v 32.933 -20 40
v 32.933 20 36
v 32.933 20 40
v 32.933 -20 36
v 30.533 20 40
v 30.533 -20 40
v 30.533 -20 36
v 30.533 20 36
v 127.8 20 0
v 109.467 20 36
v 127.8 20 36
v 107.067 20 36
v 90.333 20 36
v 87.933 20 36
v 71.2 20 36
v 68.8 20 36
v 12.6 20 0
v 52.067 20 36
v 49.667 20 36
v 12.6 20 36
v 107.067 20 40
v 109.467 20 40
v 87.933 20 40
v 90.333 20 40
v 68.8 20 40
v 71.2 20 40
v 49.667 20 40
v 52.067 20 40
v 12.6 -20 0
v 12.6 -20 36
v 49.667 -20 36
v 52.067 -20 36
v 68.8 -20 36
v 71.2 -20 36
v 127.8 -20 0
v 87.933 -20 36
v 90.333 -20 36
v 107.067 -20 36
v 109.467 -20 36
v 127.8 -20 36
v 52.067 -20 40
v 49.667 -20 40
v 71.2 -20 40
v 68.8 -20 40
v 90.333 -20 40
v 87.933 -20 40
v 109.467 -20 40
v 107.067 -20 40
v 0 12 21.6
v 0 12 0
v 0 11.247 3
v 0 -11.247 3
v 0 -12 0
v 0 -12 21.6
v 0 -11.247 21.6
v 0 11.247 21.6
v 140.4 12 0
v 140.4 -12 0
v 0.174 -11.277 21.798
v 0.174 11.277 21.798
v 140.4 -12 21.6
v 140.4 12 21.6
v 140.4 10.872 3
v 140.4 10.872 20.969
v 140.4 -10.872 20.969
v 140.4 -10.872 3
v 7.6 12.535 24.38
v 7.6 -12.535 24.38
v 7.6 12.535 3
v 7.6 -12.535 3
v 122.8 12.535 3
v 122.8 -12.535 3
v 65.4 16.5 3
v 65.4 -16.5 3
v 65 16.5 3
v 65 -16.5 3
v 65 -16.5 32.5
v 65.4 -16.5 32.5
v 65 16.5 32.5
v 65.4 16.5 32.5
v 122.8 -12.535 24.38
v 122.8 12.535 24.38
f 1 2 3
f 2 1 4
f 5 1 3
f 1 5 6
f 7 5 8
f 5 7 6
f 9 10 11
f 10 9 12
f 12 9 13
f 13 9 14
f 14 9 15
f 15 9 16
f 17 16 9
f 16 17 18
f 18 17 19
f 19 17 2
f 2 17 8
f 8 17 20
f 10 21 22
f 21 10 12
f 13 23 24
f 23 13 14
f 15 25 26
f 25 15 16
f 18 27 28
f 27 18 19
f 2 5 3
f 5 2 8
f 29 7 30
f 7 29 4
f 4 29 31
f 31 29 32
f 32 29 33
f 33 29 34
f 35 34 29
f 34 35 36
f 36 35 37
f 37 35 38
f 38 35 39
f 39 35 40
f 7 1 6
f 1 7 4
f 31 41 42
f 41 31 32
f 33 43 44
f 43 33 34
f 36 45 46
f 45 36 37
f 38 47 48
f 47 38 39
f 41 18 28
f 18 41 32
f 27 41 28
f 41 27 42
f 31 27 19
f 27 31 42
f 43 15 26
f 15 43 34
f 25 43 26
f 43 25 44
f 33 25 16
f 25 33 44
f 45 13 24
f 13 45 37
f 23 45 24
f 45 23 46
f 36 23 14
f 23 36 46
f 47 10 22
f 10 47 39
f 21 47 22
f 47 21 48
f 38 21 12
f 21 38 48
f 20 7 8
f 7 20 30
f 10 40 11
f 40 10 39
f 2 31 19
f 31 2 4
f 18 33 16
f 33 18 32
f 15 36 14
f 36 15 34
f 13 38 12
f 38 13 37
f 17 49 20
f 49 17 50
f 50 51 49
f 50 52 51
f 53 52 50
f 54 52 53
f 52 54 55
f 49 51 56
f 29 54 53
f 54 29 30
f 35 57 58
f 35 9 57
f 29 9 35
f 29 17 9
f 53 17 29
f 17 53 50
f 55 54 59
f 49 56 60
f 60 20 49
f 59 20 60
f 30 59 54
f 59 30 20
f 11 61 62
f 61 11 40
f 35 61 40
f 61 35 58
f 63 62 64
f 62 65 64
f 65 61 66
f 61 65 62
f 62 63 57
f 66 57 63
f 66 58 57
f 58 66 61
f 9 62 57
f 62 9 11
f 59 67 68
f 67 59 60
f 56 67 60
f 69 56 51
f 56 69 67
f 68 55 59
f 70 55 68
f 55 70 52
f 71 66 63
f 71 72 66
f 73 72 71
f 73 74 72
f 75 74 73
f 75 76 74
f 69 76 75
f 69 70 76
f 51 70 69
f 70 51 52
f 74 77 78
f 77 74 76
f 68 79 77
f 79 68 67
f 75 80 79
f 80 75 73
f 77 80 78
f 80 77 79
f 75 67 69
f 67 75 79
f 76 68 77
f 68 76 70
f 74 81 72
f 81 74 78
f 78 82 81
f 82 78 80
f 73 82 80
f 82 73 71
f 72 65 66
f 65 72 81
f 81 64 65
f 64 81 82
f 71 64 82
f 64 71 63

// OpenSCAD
$fn = 32;

// ----------------------------------------------------------------------
// Faired channel: 140 x 40 x 36 mm, 3.5 mm walls, faired ends
// ----------------------------------------------------------------------

// --- parameters (mm) ---
length = 140;             // channel length
width = 40;               // channel width at mid length
height = 36;              // channel height at mid length
wall = 3.5;               // side wall thickness
floor_t = 3;              // floor thickness
end_w = 24;               // faired end width
end_h = 21.6;             // faired end height
ribs = 5;                 // stiffening ribs on the top
rib_t = 2.4;              // rib thickness
rib_h = 4;                // rib height

difference() {
  union() {
    hull() {
      translate([0, -12, 0]) cube([0.4, 24, 21.6]);
      translate([12.6, -20, 0]) cube([0.4, 40, 36]);
    }
    hull() {
      translate([12.6, -20, 0]) cube([0.4, 40, 36]);
      translate([70, -20, 0]) cube([0.4, 40, 36]);
    }
    hull() {
      translate([70, -20, 0]) cube([0.4, 40, 36]);
      translate([127.4, -20, 0]) cube([0.4, 40, 36]);
    }
    hull() {
      translate([127.4, -20, 0]) cube([0.4, 40, 36]);
      translate([140, -12, 0]) cube([0.4, 24, 21.6]);
    }
    /* stiffening ribs across the flat top, sunk 0.8 mm into it */
    for (i = [1 : ribs]) {
      translate([12.6 + i * (length - 2 * 12.6) / (ribs + 1) - rib_t / 2, -width / 2, height - 0.8]) cube([rib_t, width, rib_h + 0.8]);
    }
  }
  /* cavity, 5 mm proud of both ends so the ports are cut clean */
  hull() {
    translate([-5, -10.4, 3]) cube([0.4, 20.8, 17]);
    translate([7.6, -12.535, 3]) cube([0.4, 25.07, 21.38]);
  }
  hull() {
    translate([7.6, -12.535, 3]) cube([0.4, 25.07, 21.38]);
    translate([65, -16.5, 3]) cube([0.4, 33, 29.5]);
  }
  hull() {
    translate([65, -16.5, 3]) cube([0.4, 33, 29.5]);
    translate([122.4, -12.535, 3]) cube([0.4, 25.07, 21.38]);
  }
  hull() {
    translate([122.4, -12.535, 3]) cube([0.4, 25.07, 21.38]);
    translate([145, -10.4, 3]) cube([0.4, 20.8, 17]);
  }
}
